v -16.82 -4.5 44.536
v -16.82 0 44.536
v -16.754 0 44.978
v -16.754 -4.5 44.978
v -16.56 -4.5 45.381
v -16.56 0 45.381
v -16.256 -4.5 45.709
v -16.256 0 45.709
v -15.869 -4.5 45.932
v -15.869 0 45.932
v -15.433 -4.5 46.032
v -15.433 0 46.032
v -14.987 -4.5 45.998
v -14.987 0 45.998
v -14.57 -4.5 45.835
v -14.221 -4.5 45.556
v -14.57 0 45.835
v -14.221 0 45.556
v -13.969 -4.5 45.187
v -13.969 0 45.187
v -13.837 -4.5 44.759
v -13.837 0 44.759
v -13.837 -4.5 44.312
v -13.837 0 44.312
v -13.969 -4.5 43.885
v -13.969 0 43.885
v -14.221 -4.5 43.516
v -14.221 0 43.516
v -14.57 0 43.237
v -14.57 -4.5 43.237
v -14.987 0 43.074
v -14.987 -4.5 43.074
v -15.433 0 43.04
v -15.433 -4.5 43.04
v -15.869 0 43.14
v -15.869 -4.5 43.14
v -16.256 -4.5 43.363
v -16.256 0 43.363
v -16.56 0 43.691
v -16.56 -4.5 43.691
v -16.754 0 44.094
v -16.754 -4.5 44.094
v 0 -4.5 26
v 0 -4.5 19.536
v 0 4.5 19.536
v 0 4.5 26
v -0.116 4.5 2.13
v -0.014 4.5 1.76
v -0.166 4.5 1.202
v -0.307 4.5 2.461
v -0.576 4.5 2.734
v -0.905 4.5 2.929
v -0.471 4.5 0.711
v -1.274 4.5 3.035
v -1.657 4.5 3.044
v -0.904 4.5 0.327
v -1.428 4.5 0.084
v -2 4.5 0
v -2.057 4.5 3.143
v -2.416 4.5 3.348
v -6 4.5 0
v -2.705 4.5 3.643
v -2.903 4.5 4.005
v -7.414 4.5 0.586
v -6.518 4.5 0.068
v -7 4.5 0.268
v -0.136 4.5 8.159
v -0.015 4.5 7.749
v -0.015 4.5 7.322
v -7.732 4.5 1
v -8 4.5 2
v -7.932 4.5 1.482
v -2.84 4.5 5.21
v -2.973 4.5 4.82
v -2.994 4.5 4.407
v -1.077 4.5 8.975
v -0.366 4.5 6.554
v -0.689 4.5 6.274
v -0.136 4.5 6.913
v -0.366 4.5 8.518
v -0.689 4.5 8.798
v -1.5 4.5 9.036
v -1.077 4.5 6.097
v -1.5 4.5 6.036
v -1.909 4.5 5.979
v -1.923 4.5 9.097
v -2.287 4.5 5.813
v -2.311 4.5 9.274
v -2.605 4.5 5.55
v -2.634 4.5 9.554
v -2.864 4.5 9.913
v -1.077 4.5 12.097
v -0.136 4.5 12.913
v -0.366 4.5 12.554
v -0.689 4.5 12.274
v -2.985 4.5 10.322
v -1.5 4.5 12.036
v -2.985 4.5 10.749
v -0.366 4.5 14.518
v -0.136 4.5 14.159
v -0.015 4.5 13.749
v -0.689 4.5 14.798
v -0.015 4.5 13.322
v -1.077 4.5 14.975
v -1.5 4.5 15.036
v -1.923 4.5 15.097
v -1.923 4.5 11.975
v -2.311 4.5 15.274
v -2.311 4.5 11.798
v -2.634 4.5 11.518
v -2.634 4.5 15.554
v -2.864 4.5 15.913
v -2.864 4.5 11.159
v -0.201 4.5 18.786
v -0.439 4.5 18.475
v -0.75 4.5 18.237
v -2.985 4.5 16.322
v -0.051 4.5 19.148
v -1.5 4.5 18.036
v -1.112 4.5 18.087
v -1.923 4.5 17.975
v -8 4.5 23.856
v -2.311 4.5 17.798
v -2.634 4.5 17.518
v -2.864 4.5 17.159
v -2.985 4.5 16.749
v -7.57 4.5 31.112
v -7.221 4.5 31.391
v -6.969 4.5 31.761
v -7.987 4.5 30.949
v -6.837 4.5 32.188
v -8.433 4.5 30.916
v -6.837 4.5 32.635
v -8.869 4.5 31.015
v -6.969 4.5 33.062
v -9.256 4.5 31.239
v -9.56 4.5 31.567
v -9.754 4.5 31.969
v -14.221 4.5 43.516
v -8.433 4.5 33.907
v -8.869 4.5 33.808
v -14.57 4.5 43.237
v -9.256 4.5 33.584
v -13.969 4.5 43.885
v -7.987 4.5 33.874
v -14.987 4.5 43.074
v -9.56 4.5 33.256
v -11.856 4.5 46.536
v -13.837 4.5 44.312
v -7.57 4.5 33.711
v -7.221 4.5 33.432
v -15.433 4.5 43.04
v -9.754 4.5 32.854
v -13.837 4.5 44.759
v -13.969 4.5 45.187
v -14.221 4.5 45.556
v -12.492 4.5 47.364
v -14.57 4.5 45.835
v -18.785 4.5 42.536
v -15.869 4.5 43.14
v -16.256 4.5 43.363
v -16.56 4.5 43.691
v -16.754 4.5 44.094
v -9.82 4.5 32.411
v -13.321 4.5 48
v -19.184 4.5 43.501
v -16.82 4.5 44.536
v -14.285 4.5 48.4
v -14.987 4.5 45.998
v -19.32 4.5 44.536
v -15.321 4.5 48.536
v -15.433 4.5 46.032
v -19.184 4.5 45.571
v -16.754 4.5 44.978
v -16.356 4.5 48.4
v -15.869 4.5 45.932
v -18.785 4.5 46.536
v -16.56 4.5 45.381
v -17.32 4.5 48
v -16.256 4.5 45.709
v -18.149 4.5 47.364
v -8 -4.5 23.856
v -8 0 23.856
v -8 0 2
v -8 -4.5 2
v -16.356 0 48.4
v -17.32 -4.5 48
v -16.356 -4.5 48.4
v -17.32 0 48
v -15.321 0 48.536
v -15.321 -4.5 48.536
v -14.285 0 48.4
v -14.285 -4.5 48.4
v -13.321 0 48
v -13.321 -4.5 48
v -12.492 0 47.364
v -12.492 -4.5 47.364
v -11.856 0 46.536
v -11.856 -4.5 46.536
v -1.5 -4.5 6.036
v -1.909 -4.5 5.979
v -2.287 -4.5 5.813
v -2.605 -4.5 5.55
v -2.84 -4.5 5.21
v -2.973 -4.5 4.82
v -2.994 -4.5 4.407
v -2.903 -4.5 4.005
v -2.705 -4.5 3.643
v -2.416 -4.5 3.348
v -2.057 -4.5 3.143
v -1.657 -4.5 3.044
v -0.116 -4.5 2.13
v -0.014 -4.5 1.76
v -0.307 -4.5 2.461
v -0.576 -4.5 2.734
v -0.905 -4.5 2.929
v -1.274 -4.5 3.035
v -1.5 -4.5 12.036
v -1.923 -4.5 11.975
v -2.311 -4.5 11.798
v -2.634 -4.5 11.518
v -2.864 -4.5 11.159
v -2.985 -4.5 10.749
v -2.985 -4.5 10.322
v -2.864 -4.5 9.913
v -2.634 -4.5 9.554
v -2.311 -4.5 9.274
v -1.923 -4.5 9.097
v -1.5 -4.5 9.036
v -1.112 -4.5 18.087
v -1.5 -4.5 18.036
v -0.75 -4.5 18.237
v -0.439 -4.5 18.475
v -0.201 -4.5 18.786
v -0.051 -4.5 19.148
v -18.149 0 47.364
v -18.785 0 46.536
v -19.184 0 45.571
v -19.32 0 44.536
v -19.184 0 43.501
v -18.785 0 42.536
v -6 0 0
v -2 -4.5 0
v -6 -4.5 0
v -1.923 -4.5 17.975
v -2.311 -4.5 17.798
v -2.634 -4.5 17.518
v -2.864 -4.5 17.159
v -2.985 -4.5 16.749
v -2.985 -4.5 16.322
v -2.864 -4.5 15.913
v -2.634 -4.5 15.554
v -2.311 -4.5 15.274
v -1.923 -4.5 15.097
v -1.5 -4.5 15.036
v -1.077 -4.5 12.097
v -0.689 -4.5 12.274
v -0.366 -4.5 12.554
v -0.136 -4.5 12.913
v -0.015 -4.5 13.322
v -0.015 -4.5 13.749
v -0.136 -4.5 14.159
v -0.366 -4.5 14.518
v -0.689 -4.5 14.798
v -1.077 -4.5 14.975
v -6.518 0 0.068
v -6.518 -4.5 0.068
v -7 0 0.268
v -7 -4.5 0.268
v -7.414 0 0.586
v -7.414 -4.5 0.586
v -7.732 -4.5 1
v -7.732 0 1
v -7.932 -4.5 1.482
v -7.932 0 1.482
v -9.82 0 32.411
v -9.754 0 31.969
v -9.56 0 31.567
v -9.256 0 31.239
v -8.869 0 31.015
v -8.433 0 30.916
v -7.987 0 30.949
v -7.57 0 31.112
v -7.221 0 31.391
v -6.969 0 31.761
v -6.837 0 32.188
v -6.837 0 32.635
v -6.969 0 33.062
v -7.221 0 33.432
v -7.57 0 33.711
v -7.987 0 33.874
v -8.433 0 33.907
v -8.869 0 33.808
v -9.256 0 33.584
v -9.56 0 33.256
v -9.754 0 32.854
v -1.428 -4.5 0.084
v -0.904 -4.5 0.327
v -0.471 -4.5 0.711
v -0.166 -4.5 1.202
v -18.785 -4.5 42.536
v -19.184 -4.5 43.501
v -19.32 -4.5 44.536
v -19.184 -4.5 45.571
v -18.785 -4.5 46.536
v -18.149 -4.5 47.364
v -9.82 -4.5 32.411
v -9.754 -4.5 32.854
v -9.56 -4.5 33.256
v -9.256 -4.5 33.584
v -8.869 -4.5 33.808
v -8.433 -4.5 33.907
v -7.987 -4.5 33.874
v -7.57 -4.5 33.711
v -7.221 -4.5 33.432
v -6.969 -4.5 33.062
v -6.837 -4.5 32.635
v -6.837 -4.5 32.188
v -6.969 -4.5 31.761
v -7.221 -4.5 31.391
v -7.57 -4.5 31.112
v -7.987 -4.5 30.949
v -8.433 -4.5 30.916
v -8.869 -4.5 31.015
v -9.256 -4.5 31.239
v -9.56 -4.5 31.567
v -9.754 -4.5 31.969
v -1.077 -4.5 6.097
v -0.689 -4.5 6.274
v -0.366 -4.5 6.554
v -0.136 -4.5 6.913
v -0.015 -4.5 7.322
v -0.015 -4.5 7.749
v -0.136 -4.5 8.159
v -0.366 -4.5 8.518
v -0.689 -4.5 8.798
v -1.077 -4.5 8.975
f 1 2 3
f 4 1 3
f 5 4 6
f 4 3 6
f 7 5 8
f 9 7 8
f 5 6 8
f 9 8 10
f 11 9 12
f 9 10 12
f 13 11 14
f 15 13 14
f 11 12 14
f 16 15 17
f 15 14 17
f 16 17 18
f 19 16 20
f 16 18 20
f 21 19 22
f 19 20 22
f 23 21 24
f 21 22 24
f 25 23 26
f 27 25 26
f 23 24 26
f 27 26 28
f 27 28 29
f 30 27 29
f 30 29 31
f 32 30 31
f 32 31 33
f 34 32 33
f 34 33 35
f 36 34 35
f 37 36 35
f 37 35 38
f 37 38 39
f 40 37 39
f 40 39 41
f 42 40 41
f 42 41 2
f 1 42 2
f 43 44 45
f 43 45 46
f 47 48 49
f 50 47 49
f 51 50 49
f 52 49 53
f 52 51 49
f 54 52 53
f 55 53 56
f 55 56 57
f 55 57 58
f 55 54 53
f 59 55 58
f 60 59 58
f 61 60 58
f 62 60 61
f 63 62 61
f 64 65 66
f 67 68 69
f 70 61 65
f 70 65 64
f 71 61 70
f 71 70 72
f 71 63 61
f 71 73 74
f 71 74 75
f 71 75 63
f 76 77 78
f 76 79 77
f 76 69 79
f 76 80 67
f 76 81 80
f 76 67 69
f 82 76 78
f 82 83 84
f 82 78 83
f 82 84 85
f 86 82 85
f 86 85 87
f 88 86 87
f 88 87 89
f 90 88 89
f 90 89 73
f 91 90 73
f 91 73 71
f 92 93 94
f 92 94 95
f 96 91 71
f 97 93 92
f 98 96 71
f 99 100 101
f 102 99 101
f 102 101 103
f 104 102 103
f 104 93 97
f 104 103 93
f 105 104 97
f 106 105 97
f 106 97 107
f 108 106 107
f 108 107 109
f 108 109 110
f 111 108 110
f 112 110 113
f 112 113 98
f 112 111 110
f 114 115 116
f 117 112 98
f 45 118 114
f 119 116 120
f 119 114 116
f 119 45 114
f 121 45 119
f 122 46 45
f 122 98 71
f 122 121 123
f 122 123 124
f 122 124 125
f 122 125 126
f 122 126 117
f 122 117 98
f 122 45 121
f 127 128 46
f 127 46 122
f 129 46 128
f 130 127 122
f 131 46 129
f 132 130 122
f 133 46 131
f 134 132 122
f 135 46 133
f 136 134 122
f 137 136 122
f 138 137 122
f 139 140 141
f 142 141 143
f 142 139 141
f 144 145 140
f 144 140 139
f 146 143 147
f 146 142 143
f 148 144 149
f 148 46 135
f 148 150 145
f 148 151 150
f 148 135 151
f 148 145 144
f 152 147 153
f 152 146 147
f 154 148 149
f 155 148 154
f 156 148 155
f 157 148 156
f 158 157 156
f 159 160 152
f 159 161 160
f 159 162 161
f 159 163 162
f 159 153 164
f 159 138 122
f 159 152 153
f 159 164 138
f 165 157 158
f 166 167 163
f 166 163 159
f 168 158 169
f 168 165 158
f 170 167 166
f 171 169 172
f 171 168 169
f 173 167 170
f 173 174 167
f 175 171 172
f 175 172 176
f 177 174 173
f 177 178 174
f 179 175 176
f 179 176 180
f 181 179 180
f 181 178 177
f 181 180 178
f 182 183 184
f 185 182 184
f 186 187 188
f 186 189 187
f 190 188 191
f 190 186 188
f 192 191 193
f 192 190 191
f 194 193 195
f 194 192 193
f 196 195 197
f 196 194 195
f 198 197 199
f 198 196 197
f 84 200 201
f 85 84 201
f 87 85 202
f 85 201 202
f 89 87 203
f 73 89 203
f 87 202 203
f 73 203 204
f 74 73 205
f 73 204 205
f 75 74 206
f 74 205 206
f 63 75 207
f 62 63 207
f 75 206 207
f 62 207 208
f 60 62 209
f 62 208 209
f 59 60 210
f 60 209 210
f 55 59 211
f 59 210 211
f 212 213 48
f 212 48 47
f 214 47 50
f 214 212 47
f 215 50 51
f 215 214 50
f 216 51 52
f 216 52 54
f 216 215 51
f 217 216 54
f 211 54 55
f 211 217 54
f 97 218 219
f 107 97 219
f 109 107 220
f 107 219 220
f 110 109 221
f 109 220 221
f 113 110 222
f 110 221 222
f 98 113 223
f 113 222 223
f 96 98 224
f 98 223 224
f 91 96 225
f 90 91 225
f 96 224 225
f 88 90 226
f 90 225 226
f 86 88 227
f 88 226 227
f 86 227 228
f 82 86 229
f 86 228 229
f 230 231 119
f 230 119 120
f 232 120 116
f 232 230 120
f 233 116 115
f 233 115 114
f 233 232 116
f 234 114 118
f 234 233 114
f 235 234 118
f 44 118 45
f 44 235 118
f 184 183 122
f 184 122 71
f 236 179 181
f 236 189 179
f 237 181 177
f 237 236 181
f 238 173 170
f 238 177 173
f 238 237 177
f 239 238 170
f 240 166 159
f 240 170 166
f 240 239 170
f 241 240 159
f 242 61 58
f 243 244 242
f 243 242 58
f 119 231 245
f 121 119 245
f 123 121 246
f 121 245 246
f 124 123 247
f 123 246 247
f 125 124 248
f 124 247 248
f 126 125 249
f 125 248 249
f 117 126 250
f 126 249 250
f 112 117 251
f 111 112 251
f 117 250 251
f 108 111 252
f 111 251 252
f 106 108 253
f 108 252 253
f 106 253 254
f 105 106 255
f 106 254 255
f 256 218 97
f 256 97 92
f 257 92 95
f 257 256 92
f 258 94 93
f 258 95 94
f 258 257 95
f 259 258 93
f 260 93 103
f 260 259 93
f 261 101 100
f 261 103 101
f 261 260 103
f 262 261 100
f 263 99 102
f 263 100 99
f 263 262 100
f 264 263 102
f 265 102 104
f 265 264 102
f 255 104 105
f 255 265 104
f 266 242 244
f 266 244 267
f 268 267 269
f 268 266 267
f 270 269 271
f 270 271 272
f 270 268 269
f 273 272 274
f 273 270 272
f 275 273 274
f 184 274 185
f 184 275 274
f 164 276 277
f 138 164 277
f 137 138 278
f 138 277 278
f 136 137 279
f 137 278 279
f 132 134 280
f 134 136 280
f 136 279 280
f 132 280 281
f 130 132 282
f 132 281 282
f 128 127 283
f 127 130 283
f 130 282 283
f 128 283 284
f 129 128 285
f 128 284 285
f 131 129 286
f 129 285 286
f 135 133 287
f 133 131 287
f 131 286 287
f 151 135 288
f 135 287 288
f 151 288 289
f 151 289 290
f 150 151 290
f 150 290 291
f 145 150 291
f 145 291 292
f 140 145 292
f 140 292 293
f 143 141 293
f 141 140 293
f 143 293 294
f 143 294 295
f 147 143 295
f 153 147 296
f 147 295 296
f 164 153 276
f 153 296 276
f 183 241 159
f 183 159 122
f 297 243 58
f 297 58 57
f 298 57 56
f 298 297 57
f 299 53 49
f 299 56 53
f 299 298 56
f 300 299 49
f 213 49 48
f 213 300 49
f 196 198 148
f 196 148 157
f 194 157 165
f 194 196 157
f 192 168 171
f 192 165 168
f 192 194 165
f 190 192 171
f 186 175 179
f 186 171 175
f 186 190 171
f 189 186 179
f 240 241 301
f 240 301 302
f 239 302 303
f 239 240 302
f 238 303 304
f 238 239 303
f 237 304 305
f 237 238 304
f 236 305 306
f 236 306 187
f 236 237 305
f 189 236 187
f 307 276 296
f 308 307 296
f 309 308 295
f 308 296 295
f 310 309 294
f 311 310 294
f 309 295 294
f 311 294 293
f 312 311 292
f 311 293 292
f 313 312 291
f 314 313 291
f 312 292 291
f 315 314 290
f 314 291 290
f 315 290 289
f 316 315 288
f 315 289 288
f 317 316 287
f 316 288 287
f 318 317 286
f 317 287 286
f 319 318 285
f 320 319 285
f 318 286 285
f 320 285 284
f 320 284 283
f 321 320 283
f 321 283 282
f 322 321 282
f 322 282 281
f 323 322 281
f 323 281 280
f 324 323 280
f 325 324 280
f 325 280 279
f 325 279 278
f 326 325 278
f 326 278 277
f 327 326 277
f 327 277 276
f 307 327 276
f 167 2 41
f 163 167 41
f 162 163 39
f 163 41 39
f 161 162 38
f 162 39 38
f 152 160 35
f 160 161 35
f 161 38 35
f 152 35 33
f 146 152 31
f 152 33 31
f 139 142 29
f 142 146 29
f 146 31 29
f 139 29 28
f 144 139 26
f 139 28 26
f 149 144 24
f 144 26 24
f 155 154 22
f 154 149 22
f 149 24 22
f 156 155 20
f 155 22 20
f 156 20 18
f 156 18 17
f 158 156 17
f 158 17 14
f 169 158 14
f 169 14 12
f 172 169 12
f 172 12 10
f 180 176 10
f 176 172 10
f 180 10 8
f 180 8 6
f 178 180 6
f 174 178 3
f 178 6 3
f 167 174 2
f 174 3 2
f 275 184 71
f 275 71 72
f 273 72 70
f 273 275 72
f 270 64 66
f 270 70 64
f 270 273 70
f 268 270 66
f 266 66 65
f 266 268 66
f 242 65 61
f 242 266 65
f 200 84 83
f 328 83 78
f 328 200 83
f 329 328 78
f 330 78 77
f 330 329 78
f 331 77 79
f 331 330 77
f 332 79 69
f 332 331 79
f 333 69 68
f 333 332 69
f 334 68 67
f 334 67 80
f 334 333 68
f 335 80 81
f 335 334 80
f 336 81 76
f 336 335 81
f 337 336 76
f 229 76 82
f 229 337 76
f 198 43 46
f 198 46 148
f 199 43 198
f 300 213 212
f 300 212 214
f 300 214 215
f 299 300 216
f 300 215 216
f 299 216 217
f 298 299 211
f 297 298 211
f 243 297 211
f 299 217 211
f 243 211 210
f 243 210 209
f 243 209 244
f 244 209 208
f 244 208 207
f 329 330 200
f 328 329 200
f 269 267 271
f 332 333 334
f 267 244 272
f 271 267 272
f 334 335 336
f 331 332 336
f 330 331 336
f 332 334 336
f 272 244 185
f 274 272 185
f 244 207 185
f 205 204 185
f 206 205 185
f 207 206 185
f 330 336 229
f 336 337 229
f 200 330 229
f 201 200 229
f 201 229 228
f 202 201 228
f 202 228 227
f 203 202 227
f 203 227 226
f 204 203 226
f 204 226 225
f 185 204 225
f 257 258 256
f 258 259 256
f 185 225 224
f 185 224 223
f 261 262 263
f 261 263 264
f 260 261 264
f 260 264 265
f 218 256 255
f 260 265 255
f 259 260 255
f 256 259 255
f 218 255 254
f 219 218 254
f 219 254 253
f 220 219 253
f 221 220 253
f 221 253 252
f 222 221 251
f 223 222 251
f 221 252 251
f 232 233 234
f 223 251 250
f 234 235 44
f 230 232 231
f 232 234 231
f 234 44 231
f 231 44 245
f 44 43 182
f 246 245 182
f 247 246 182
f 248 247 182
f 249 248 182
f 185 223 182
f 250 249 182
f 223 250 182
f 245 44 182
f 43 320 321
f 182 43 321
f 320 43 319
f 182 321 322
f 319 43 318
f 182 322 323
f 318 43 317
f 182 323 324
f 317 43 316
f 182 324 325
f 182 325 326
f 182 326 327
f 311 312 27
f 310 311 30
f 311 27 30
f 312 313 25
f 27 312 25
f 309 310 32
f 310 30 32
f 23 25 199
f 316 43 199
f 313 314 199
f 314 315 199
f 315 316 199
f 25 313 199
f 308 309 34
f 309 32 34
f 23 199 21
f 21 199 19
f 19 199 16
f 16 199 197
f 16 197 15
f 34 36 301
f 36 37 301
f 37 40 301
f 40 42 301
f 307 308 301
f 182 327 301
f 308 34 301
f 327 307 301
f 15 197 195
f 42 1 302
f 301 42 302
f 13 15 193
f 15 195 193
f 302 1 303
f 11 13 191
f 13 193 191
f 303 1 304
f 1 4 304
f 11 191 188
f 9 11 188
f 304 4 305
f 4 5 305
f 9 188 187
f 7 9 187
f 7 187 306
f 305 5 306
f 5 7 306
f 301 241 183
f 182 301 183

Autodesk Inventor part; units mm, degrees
ref_plane "YZ Plane" through (0, 0, 0) normal (1, 0, 0) x (0, 1, 0)
ref_plane "XZ Plane" through (0, 0, 0) normal (0, 1, 0) x (-1, 0, 0)
ref_plane "XY Plane" through (0, 0, 0) normal (0, 0, 1) x (1, 0, 0)
sketch "Boceto1" plane through (0, 0, 0) normal (0, 1, 0) x (-1, 0, 0)
  line L0 (0, 2) -> (0, 26)
  line L1 (0, 26) -> (11.8564, 46.5359)
  line L2 (17.3205, 48) -> (17.3205, 48)
  line L3 (18.7846, 42.5359) -> (8, 23.8564)
  line L4 (8, 23.8564) -> (8, 2)
  line L5 (6, 0) -> (2, 0)
  arc A0 (81.7987, 0) -> (84.2987, 9.3301) centre (81.7987, 5) ccw
  arc A1 (18.7846, 42.5359) -> (17.3205, 48) centre (15.3205, 44.5359) ccw
  arc A2 (17.3205, 48) -> (11.8564, 46.5359) centre (15.3205, 44.5359) ccw
  arc A3 (6, 0) -> (8, 2) centre (6, 2) ccw
  arc A4 (0, 2) -> (2, 0) centre (2, 2) ccw
  circle A5 centre (15.3205, 44.5359) radius 1.5
  line L6 (15.3205, 44.5359) -> (4.5694, 25.9145) construction
  circle A6 centre (8.3205, 32.4115) radius 1.5
  point P0 (0, 0)
  point P1 (13.8564, 50)
  point P2 (8, 0)
  point P3 (20.7846, 46)
  point P4 (4, 0)
  dimension "d0" = 90
  dimension "d2" = 26
  dimension "d7" = 8
  dimension "d10" = 150
  dimension "d11" = 8
  dimension "d12" = 5
  dimension "d13" = 4
  dimension "d14" = 4
  dimension "d15" = 2
  dimension "d16" = 3
  dimension "d17" = 3
  dimension "d18" = 14
  dimension "d19" = 48
extrude "Extrusión1" add sketch "Boceto1" along normal mid plane 9
sketch "Boceto2" plane through (0, -4.5, 0) normal (0, -1, 0) x (1, 0, 0)
  arc A0 (-1.5, 18.0359) -> (-1.5, 21.0359) centre (-1.5, 19.5359) ccw
  arc A1 (-1.5, 18.0359) -> (-1.5, 15.0359) centre (-1.5, 16.5359) ccw
  arc A2 (-1.5, 12.0359) -> (-1.5, 15.0359) centre (-1.5, 13.5359) ccw
  arc A3 (-2, 0) -> (0, 2) centre (-2, 2) ccw construction
  arc A4 (-1.5, 12.0359) -> (-1.5, 9.0359) centre (-1.5, 10.5359) ccw
  arc A5 (-1.5, 6.0359) -> (-1.5, 9.0359) centre (-1.5, 7.5359) ccw
  arc A6 (-1.5, 6.0359) -> (-1.5, 3.0359) centre (-1.5, 4.5359) ccw
  arc A7 (-1.5, 0.0523) -> (-1.6566, 3.0441) centre (-1.5, 1.5523) ccw
  line L0 (-1.5, 31) -> (-1.5, -6.4684) construction
  line L1 (0, 26) -> (0, 2) construction
  line L2 (0, 1.5523) -> (0, 19.5359)
  point P0 (0, 0)
  point P1 (0, 7.5359)
  point P2 (0, 13.5359)
  dimension "d24" = 3
  dimension "d25" = 3
  dimension "d26" = 3
  dimension "d27" = 3
  dimension "d28" = 3
  dimension "d29" = 3
  dimension "d30" = 3
  dimension "d31" = 1.5
extrude "Extrusión2" cut sketch "Boceto2" against normal blind 9
equation "\"Radio_pliegue\" = Grosor"
equation "\"Anchura_desahogo_plegado\" = Grosor"
equation "\"Profundidad_desahogo_plegado\" = 0.5 * Grosor"
equation "\"Tamaño_destalonado\" = 4 * Grosor"
equation "\"Remanente_mínimo\" = 2 * Grosor"
equation "\"Radiodetransición\" = Radio_pliegue"
equation "\"Tamaño_de_radio_de_Jacobi\" = Radio_pliegue"
equation "\"TamañoSeparación\" = Grosor"
equation "\"Grosor\" = 0.5"
properties part number "Pinza_pieza3"
